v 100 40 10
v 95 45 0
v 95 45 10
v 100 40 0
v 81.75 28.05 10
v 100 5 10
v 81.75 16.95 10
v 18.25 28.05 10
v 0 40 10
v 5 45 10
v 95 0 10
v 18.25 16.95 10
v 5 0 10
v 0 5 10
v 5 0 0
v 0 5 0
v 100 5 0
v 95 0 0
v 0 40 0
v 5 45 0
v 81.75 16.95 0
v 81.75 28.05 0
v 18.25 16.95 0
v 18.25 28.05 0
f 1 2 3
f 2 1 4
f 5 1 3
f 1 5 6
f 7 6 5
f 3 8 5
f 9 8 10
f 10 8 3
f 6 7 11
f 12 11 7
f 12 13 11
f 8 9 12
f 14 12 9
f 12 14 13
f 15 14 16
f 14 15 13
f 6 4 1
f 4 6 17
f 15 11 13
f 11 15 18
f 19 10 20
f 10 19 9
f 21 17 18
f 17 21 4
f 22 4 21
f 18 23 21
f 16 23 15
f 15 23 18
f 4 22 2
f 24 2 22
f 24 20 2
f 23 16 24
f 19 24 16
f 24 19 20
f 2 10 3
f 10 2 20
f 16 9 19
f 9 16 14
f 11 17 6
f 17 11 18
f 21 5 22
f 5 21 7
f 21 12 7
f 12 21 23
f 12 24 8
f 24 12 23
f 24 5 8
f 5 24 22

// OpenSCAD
$fn = 32;

// ----------------------------------------------------------------------
// Windowed plate: 1 voids, 100 x 45 x 10 mm
// ----------------------------------------------------------------------

// --- parameters (mm) ---
plate_l = 100;            // plate length, X
plate_w = 45;             // plate width, Y
plate_t = 10;             // plate thickness, Z
edge_margin = 12;         // wall from the plate edge to any window
win1_l = 63.5;            // window length
win1_w = 11.1;            // window width
depth_1 = 10;             // depth of void 1 (full thickness = through)
corner_c = 5;             // corner chamfer of the plate

profile = [[5, 0], [95, 0], [100, 5], [100, 40], [95, 45], [5, 45], [0, 40], [0, 5]];  // primary outline, 8 points, counter clockwise
void_1 = [[18.25, 16.95], [81.75, 16.95], [81.75, 28.05], [18.25, 28.05]];  // large central window, 4 points

// --- the one profile operation ---
difference() {
  linear_extrude(height = plate_t) polygon(points = profile);
  translate([0, 0, -1])
    linear_extrude(height = plate_t + 2) polygon(points = void_1);
}
